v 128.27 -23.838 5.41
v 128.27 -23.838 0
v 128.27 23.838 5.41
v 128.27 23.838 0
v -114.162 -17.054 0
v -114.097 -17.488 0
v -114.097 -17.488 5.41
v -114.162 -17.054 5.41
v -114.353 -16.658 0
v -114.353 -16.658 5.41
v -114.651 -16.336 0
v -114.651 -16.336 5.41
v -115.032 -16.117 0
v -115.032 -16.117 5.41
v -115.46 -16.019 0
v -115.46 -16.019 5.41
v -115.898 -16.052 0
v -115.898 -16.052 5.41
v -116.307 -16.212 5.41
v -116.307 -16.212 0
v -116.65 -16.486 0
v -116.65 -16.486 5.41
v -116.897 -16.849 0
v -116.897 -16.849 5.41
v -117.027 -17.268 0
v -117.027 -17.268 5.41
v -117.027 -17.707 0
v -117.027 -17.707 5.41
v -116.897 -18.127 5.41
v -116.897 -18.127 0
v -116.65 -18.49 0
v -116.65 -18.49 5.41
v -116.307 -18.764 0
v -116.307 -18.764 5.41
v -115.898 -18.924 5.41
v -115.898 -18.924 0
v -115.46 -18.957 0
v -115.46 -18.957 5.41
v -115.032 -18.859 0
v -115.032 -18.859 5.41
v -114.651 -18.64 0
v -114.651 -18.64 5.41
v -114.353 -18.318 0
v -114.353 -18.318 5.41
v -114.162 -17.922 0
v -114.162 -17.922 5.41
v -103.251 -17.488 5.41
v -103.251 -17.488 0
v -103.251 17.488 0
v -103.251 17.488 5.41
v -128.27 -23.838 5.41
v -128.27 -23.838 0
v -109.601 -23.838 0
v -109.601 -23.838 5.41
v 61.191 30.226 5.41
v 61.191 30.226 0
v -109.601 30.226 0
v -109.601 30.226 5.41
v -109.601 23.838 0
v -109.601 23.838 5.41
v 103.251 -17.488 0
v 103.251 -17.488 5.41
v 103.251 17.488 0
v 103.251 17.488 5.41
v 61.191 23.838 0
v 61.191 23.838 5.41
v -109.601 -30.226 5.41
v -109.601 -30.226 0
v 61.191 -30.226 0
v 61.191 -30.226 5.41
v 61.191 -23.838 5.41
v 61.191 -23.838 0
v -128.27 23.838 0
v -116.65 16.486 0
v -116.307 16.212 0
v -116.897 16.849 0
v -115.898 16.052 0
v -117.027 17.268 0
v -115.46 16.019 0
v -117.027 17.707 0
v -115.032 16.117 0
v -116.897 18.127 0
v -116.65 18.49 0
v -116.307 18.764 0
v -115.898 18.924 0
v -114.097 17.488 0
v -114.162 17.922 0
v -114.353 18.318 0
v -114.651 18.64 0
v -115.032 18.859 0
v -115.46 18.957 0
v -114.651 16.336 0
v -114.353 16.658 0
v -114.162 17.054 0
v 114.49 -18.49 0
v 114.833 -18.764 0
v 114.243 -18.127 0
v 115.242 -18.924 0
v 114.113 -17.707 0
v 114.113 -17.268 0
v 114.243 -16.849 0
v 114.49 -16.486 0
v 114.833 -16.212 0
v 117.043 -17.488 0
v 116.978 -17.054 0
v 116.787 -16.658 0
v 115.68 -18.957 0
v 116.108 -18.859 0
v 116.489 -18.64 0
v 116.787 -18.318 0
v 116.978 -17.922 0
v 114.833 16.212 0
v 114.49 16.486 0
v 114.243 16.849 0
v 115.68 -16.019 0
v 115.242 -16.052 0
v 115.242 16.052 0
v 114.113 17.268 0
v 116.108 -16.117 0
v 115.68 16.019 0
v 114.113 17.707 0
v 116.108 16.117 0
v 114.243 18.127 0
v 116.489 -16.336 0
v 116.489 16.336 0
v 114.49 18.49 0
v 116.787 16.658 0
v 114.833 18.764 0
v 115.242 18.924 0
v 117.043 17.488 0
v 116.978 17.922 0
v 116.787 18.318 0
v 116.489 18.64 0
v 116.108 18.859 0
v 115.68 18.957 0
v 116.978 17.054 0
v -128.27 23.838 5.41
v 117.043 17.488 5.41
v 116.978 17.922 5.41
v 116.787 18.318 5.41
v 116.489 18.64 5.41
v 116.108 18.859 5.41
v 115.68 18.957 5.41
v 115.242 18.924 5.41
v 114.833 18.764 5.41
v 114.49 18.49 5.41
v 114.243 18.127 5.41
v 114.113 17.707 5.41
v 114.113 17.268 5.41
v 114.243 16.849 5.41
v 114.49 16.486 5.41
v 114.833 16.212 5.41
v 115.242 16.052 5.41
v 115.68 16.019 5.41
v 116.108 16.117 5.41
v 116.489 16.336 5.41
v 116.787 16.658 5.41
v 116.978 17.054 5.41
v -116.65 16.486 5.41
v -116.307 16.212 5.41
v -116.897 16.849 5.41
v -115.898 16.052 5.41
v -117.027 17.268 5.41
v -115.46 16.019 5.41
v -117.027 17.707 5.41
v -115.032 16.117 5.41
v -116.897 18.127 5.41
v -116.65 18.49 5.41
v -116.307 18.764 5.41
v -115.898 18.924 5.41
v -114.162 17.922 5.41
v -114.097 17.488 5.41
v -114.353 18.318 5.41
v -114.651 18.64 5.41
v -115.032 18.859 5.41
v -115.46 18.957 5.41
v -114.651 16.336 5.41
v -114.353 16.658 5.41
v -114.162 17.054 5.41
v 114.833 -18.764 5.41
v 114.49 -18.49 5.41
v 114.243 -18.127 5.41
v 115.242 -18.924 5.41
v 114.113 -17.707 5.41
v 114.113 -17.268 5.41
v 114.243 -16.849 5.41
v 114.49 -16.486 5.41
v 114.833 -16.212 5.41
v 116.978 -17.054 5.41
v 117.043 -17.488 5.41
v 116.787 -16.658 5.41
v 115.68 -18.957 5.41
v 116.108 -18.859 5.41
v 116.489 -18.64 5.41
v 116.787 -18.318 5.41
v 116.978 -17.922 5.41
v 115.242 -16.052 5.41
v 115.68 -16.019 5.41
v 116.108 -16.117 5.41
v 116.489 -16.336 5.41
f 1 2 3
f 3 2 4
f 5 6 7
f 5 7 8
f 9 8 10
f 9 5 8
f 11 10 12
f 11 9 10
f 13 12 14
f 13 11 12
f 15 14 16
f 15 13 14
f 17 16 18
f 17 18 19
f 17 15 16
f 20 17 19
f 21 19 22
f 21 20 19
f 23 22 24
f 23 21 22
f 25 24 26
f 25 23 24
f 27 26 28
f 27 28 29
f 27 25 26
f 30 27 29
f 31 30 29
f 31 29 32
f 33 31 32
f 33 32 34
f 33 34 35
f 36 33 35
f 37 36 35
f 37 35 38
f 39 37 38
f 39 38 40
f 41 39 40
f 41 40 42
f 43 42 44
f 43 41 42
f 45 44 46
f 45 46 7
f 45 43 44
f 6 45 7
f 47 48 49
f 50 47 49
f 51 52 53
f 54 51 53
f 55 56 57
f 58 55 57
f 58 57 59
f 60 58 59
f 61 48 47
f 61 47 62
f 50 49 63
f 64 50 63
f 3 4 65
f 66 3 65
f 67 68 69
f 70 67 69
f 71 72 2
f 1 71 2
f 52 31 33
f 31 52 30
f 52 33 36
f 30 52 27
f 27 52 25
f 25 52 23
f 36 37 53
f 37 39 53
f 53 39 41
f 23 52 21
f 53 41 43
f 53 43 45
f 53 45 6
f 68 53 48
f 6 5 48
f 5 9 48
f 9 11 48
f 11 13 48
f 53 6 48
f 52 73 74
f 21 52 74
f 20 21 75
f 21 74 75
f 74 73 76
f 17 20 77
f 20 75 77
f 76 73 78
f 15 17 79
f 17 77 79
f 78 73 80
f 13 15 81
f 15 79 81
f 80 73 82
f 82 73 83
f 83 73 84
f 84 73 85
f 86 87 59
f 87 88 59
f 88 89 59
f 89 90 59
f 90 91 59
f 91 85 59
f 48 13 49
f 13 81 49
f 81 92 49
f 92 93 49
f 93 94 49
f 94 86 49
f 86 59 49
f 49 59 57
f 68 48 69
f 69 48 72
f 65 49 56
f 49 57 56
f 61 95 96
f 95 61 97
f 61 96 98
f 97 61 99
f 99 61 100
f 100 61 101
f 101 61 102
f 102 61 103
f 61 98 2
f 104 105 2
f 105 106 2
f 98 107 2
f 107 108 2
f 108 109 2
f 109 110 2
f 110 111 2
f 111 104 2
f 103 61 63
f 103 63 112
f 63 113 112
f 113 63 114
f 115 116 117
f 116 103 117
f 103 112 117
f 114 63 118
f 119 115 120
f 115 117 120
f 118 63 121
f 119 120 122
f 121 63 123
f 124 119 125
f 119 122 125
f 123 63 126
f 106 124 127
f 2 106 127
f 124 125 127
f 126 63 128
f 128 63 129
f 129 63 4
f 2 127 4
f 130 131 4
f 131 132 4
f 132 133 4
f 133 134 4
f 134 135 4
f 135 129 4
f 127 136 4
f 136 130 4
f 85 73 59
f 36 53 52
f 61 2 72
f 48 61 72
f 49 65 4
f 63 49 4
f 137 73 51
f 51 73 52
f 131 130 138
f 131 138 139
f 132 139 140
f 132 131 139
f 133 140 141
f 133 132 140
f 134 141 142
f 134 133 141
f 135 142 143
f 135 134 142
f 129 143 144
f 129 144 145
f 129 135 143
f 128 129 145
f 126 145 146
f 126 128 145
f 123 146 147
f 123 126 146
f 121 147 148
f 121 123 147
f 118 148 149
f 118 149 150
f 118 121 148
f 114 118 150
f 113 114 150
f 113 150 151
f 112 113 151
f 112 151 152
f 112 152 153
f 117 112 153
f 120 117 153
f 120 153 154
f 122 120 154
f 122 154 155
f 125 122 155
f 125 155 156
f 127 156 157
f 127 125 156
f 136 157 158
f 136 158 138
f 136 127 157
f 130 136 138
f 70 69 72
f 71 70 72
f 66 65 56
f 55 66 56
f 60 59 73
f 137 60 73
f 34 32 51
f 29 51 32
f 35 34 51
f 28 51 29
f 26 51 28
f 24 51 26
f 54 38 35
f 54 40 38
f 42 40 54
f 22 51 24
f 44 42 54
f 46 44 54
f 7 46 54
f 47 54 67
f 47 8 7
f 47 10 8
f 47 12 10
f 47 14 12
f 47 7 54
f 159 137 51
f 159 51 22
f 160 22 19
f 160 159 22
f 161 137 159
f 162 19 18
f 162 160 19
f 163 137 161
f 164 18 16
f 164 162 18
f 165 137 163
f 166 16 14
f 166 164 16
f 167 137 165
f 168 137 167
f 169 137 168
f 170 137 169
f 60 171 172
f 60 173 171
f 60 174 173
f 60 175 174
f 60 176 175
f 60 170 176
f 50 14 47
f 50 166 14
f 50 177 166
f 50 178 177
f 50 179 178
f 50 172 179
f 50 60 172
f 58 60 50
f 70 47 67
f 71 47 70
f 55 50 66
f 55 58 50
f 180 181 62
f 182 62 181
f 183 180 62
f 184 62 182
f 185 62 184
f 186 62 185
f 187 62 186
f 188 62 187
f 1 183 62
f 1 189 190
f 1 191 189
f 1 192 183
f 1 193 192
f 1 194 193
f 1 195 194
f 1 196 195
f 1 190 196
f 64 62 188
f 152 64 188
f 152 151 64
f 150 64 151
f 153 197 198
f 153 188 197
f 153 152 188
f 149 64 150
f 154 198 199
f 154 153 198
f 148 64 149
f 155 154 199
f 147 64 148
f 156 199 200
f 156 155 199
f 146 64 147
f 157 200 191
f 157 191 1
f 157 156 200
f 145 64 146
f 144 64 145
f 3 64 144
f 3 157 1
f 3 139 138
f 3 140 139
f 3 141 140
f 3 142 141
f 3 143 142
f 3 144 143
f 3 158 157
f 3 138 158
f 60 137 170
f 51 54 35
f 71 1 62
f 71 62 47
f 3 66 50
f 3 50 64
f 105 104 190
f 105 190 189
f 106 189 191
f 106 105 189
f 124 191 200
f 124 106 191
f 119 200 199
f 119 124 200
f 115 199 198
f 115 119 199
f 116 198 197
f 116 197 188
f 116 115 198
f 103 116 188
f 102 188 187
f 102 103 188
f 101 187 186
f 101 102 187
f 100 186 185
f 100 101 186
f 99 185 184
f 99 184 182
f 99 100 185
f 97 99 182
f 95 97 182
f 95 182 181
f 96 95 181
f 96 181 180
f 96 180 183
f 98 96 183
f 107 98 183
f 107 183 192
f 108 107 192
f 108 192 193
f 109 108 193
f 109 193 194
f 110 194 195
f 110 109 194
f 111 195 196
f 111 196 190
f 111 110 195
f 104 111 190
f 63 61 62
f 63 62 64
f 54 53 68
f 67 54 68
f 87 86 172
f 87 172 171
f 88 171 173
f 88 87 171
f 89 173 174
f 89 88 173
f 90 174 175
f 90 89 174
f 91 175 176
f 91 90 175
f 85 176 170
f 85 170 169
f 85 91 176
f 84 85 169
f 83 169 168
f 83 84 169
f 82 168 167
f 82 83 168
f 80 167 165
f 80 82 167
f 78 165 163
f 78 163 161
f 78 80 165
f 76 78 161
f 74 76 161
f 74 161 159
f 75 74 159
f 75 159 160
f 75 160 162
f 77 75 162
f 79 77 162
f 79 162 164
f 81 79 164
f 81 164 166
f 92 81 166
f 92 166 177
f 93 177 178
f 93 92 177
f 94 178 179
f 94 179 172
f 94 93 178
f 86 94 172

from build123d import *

# Parameters (mm, degrees)
SKETCH1_W           = 206.502
SKETCH1_H           = 34.9758
SKETCH1_R           = 1.4732
BOSS_EXTRUDE1_DEPTH = 5.4102


with BuildPart() as part:
    # Sketch1 → Boss-Extrude1 (new body)
    with BuildSketch(Plane.XY):
        Polygon((61.191000046, 23.8379), (61.191000046, 30.226), (-109.601, 30.226), (-109.601, 23.8379), (-128.27, 23.8379), (-128.27, -23.8379), (-109.601, -23.8379), (-109.601, -30.226), (61.191000046, -30.226), (61.191000046, -23.8379), (128.27, -23.8379), (128.27, 23.8379), align=None)
        Rectangle(SKETCH1_W, SKETCH1_H, mode=Mode.SUBTRACT)
        with Locations((-115.57, 17.4879)):
            Circle(SKETCH1_R, mode=Mode.SUBTRACT)
        with Locations((-115.57, -17.4879)):
            Circle(SKETCH1_R, mode=Mode.SUBTRACT)
        with Locations((115.57, -17.4879)):
            Circle(SKETCH1_R, mode=Mode.SUBTRACT)
        with Locations((115.57, 17.4879)):
            Circle(SKETCH1_R, mode=Mode.SUBTRACT)
    extrude(amount=BOSS_EXTRUDE1_DEPTH)


solid = part.part
